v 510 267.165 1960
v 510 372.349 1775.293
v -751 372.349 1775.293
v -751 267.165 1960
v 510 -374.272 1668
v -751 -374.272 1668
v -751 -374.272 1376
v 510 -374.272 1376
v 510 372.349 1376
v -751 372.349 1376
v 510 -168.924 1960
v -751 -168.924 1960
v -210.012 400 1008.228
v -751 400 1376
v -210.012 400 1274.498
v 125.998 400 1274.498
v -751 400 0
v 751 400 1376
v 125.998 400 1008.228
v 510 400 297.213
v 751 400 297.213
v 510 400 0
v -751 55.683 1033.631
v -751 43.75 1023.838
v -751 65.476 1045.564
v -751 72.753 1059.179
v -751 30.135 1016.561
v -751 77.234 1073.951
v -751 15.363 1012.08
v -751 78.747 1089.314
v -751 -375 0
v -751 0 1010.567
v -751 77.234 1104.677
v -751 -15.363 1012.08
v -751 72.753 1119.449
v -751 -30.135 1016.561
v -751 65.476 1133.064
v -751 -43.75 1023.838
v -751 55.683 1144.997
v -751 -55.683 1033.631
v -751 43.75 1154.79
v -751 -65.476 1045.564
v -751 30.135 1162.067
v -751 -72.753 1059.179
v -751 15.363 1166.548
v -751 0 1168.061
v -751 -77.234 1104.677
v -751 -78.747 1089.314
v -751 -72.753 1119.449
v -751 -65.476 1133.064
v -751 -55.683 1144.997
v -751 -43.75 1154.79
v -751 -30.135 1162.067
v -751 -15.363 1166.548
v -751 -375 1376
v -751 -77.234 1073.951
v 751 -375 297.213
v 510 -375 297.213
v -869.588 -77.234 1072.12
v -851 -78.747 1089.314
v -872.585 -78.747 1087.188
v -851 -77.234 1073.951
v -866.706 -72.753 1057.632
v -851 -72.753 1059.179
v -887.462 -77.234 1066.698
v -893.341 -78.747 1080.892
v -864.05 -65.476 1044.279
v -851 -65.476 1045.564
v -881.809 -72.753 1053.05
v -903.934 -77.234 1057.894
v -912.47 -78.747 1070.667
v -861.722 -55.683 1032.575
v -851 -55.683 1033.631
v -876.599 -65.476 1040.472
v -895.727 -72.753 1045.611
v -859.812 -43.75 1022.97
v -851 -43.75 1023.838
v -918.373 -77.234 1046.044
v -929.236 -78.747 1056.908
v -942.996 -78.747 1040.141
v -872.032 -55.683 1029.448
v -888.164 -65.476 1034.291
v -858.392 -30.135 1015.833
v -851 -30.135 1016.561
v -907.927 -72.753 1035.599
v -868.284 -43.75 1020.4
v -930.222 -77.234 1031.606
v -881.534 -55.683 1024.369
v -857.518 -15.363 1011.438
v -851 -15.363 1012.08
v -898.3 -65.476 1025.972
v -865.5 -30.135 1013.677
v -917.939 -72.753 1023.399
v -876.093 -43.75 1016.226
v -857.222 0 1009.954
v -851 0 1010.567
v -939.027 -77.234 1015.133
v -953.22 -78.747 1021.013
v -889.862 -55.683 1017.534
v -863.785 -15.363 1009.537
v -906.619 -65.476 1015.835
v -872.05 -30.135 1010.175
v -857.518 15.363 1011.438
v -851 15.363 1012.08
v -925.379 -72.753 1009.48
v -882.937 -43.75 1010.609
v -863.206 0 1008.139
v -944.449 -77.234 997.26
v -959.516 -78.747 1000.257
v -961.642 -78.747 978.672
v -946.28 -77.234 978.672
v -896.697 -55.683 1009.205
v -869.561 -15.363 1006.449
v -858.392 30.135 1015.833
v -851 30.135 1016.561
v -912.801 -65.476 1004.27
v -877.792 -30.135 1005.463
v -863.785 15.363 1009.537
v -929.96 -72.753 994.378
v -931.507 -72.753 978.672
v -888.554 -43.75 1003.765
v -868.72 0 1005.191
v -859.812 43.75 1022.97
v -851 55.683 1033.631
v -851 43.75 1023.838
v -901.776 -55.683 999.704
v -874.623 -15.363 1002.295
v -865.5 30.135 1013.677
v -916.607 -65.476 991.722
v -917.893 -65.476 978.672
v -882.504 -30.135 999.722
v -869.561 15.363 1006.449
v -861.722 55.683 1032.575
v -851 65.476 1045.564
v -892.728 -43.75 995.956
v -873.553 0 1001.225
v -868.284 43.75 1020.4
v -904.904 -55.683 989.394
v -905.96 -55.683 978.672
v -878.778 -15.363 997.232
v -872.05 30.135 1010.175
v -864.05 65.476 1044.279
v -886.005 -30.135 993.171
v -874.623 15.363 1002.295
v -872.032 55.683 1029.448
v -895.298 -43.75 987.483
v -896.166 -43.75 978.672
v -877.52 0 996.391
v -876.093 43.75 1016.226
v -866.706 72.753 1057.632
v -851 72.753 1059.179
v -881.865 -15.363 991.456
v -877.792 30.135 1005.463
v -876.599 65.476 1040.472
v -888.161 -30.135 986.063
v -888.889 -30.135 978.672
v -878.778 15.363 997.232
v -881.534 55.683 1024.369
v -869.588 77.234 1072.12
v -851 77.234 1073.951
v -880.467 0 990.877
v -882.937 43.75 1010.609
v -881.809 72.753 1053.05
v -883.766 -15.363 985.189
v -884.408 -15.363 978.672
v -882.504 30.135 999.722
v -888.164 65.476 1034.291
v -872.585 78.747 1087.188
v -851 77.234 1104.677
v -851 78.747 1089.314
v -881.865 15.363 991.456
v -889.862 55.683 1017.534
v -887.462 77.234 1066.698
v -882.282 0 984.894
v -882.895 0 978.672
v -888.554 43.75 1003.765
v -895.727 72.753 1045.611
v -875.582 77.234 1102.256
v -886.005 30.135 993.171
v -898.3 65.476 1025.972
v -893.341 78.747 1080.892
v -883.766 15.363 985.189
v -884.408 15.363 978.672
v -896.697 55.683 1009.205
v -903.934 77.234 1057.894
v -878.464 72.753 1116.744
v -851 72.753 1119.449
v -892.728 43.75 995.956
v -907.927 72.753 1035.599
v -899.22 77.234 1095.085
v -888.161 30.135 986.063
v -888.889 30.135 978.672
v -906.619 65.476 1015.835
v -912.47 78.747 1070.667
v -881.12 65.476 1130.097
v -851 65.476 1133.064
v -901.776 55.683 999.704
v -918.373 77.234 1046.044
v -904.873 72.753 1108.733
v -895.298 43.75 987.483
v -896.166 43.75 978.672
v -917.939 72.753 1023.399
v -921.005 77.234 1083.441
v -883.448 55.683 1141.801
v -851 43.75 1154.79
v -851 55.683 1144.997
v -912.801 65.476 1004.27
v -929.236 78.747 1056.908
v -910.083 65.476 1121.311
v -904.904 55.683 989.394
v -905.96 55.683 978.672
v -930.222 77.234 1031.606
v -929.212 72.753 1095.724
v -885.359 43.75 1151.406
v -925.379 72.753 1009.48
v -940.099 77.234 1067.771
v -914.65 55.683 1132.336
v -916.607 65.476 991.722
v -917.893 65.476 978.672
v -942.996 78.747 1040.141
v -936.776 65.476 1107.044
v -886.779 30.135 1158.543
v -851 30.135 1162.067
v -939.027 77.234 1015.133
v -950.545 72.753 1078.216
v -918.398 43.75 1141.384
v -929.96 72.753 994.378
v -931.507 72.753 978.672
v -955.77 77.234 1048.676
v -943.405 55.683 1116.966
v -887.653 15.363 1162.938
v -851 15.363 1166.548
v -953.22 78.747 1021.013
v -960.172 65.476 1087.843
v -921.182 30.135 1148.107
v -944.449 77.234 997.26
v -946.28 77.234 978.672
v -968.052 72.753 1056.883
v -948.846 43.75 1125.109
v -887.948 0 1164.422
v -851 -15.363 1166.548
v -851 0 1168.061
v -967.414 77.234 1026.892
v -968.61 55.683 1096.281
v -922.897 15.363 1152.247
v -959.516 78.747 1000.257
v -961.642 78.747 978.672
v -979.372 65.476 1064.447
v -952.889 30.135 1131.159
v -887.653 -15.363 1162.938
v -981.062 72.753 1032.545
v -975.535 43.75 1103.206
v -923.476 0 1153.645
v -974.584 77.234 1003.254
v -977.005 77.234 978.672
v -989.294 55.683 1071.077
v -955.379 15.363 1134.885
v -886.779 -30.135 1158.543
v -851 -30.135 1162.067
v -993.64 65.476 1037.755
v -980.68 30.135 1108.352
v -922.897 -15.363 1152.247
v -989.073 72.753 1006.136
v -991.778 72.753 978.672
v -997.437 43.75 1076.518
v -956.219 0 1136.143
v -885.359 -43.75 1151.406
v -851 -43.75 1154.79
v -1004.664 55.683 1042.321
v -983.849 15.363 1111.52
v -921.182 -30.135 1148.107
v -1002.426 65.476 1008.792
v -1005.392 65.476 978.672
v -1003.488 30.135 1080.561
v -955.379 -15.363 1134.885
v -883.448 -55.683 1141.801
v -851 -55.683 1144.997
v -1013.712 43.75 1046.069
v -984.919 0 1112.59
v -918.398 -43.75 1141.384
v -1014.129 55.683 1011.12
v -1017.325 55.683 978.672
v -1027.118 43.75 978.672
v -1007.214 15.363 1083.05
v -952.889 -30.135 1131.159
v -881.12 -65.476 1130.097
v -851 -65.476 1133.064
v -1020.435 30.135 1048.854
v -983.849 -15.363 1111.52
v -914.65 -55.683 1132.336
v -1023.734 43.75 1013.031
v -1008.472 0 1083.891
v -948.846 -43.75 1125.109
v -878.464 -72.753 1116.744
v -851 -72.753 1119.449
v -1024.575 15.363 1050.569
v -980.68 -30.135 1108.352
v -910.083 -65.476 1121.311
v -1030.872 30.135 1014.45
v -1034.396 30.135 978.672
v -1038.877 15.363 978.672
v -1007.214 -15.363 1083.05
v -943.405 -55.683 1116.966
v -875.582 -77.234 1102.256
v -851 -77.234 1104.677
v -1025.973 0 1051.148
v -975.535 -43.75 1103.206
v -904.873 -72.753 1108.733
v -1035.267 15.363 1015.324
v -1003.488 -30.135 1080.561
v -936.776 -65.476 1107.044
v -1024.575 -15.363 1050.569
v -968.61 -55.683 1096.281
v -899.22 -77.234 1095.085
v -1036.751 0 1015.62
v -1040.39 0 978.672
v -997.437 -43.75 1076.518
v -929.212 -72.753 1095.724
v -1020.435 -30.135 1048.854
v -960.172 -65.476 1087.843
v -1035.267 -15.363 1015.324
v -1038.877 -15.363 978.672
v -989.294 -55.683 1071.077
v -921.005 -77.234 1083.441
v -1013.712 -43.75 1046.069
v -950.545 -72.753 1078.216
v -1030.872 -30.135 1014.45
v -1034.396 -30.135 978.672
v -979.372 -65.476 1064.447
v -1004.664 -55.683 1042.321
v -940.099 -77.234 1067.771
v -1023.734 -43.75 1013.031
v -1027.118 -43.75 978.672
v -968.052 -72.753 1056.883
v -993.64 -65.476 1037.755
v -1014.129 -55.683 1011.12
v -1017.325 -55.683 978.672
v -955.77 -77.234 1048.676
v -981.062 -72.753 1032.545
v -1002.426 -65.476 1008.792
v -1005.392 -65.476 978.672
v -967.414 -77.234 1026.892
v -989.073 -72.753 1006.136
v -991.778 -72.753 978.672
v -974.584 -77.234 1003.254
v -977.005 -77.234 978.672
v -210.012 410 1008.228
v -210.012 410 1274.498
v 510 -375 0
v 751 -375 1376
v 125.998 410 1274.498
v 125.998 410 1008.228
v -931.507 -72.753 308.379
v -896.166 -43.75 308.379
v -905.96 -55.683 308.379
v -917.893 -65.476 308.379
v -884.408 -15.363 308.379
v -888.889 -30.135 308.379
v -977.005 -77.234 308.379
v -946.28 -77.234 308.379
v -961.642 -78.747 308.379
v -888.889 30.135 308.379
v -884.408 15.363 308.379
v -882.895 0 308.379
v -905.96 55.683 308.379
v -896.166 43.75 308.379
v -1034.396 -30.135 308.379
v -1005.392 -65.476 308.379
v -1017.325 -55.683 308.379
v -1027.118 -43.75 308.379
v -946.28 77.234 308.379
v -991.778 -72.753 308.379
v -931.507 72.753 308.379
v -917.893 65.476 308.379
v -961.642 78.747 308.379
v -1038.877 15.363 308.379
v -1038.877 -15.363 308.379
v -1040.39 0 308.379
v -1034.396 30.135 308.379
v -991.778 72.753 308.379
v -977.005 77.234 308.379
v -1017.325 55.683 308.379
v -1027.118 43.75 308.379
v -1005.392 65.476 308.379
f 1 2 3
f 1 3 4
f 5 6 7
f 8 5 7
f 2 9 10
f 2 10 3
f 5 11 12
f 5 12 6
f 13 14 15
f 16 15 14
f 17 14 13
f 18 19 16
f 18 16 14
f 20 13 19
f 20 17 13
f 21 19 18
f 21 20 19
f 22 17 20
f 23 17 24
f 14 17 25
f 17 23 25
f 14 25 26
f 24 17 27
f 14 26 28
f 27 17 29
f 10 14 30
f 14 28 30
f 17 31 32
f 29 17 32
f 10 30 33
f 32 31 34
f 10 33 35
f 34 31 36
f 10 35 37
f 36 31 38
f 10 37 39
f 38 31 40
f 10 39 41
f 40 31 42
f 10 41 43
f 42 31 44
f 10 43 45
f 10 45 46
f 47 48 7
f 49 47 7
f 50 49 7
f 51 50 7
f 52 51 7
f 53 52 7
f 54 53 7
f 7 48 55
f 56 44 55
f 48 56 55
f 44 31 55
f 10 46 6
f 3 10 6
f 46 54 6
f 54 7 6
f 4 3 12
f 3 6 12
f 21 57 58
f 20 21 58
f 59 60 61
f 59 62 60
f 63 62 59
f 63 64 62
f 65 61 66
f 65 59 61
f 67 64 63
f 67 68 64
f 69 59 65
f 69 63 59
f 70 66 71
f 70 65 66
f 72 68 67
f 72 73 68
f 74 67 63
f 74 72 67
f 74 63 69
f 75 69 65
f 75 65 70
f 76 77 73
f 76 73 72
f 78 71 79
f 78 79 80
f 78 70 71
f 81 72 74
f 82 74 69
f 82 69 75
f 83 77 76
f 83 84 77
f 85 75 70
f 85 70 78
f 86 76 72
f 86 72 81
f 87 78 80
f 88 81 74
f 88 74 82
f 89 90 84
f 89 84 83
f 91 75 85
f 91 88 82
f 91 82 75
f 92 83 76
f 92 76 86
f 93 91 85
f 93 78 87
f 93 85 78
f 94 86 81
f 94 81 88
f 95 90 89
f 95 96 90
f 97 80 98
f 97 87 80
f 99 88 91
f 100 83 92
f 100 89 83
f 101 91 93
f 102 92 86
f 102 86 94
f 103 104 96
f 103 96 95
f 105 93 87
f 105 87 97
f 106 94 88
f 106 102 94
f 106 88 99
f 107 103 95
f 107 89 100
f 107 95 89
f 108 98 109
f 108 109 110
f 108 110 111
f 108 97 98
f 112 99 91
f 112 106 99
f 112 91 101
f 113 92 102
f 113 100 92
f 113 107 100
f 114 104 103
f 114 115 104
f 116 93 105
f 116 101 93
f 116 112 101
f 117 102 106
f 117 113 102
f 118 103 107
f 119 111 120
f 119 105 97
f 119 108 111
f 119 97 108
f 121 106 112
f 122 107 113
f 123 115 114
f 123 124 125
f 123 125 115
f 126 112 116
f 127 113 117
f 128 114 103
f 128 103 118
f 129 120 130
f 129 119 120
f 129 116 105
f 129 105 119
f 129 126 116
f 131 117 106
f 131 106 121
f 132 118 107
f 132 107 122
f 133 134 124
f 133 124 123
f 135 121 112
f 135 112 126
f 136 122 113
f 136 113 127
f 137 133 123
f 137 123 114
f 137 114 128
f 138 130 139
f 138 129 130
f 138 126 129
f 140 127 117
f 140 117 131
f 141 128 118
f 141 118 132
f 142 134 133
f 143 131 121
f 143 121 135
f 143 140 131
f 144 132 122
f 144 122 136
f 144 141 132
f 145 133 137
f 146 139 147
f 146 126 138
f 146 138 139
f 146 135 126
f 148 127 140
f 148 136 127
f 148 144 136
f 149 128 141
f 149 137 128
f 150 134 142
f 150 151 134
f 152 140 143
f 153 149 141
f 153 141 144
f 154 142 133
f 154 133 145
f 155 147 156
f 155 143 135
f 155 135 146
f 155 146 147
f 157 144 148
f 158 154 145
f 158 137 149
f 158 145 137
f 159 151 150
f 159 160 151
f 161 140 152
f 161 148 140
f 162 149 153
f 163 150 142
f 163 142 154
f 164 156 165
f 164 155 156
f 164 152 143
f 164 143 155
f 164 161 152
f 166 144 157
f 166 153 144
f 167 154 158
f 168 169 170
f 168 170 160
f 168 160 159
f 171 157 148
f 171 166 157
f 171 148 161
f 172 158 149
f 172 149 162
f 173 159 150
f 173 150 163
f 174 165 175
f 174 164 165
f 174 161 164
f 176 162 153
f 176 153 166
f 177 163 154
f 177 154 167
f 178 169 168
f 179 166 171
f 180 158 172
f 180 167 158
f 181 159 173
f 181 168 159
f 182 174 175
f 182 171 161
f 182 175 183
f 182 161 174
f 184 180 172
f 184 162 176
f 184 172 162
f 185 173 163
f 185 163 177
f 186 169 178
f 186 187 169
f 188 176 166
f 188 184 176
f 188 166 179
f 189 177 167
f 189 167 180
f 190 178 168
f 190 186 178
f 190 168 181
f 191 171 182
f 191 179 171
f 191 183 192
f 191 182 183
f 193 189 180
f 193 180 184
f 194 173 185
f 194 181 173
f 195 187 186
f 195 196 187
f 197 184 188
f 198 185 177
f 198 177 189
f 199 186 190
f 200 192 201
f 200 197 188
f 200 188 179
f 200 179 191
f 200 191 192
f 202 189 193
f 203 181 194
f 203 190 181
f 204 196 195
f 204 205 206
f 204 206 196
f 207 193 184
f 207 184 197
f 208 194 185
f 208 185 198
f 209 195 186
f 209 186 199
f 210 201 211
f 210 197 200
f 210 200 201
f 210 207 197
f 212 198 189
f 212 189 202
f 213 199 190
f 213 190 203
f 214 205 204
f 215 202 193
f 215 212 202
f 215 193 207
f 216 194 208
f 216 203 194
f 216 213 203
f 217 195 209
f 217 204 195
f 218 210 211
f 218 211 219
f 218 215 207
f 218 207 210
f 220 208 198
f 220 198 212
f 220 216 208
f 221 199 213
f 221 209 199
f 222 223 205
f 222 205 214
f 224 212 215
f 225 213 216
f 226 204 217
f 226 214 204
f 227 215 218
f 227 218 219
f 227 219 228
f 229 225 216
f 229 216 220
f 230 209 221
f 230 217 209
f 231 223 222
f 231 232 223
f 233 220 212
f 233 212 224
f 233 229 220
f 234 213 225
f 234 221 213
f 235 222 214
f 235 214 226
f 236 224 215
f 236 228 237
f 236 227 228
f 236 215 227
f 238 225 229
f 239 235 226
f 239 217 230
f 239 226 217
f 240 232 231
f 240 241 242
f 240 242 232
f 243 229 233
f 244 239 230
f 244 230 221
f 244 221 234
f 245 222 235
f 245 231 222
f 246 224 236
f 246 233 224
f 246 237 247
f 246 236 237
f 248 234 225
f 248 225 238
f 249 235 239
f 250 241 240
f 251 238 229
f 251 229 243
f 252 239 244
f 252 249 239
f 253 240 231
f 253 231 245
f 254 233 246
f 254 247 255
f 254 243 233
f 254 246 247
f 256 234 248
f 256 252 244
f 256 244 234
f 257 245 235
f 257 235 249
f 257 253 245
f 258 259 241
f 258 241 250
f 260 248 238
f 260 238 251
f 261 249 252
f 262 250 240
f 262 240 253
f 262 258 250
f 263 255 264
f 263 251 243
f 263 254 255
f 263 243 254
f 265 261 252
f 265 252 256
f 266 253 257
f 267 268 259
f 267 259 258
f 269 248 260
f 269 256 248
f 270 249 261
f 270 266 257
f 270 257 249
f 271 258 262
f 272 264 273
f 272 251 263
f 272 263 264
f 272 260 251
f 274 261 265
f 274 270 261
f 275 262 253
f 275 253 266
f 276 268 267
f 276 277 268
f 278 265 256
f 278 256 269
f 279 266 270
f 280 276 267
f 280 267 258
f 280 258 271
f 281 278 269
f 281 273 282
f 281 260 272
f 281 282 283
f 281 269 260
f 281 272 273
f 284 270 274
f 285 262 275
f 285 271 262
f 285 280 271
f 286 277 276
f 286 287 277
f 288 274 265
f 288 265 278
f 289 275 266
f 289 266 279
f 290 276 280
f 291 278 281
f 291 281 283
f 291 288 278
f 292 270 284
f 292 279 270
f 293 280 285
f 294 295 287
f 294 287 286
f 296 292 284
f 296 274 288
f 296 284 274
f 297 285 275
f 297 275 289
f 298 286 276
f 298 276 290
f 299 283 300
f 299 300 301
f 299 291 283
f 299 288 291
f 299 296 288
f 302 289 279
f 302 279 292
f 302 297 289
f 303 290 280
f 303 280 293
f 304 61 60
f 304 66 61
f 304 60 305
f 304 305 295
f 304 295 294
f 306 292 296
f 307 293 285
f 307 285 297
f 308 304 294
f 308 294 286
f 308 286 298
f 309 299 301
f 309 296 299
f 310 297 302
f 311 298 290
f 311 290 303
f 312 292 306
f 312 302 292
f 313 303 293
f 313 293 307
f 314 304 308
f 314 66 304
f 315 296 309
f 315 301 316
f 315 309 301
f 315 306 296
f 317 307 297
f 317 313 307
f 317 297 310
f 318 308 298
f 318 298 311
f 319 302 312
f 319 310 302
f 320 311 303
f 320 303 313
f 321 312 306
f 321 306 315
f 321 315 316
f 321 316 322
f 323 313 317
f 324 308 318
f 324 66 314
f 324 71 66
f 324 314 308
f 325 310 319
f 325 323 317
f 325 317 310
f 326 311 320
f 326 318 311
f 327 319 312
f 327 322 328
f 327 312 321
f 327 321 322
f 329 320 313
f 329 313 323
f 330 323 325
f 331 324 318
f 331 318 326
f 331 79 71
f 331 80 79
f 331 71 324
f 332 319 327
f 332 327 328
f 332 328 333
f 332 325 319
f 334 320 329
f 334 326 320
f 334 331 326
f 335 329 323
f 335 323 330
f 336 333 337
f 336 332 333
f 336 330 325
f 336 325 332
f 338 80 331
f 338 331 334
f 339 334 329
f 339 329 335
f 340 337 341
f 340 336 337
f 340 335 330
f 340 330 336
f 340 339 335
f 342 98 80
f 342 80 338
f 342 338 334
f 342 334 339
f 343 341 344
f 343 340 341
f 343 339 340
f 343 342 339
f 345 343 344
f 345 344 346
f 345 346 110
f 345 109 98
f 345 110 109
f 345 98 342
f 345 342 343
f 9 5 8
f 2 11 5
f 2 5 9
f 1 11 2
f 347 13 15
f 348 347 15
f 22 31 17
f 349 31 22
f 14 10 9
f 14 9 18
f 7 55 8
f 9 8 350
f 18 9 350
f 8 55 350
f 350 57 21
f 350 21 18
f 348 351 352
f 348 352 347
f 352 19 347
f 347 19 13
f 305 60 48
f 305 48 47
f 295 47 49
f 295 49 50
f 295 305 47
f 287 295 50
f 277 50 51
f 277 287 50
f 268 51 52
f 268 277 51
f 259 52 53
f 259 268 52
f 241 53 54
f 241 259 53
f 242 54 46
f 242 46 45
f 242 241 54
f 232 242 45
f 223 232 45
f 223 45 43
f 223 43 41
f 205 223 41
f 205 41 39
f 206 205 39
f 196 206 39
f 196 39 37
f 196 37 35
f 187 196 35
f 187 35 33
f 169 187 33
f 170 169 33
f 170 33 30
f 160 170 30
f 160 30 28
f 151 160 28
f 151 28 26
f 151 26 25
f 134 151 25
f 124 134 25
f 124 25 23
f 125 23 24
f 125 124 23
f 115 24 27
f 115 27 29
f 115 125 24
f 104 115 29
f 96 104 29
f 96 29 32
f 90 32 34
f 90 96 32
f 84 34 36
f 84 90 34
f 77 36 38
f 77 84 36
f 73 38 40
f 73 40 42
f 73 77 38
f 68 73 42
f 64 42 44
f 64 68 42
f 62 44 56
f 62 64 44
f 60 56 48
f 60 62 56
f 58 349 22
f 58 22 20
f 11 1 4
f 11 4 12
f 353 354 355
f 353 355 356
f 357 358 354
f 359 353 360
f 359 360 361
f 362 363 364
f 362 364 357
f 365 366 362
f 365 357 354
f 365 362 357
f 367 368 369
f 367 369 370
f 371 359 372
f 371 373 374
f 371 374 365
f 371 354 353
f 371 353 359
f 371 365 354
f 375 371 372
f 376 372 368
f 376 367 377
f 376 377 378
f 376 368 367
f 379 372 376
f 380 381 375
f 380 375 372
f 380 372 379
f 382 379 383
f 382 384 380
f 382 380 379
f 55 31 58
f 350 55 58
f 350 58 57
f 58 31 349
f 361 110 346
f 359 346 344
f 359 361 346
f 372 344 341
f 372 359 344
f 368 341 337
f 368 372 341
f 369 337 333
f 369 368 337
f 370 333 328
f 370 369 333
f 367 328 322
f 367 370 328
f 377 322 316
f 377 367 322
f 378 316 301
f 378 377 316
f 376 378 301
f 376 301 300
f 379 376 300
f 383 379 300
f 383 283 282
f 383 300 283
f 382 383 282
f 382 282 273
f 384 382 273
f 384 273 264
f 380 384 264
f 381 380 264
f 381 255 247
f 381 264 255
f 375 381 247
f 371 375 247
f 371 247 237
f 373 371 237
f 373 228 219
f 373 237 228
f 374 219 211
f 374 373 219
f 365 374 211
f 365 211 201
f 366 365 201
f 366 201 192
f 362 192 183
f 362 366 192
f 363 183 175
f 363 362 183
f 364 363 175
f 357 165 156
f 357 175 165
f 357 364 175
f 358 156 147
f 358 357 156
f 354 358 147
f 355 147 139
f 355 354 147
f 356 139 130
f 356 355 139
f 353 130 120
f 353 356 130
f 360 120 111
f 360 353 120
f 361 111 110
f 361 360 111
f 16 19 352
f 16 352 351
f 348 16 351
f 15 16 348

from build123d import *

# Parameters (mm, degrees)
F0_W      = 1502
F0_H      = 750
F1_DEPTH  = 1376
F3_R      = 78.7473915707
F5_W      = 750
F5_H      = 297.2130477428
F6_DEPTH  = 241
F8_DEPTH  = 1261
F9_DEPTH  = 25
F10_W     = 336.0105156898
F10_H     = 266.2700414658
F11_DEPTH = 10


with BuildPart() as f1:
    # F0 (on Top) → F1 (new body)
    with BuildSketch(Plane.XY):
        Rectangle(F0_W, F0_H)
    extrude(amount=F1_DEPTH)

    # F4: sweep along a path in F2
    with BuildLine(Plane.XZ) as f4_path:
        Line((-751, 1078.6715745926), (-851, 1078.6715745926))
        ThreePointArc((-851, 1078.6715745926), (-921.7106781187, 1049.3822527112), (-951, 978.6715745926))
        Line((-951, 978.6715745926), (-951, 308.378726244))
    # F3 (on face) → F4 (sweep)
    with BuildSketch(Plane(origin=(-751, 0, 0), x_dir=(0, -1, 0), z_dir=(-1, 0, 0))):
        with Locations((0, 1089.3139839172)):
            Circle(F3_R)
    sweep(path=f4_path.line)

    # F5 (on face) → F6 (cut)
    with BuildSketch(Plane.YZ.offset(751)):
        with Locations((0, 148.6065238714)):
            Rectangle(F5_W, F5_H)
    extrude(amount=-F6_DEPTH, mode=Mode.SUBTRACT)

    # F7 (on face) → F8 (join, through all)
    with BuildSketch(Plane.YZ.offset(510)):
        Polygon((-374.2722838136, 1668), (-374.2722838136, 1376), (372.3494112492, 1376), (372.3494112492, 1775.292634964), (267.1647369862, 1960), (-168.9238548279, 1960), align=None)
    extrude(amount=-F8_DEPTH)

    # F9 (add): a face of the model
    f9_faces = [f1.faces().sort_by_distance(p)[0] for p in [
        (-22.6360261364, 375, 707.3651464289),
    ]]
    extrude(f9_faces, amount=F9_DEPTH)

    # F10 (on face) → F11 (join)
    with BuildSketch(Plane(origin=(0, 400, 0), x_dir=(-1, 0, 0), z_dir=(0, 1, 0))):
        with Locations((42.0069694519, 1141.3634419441)):
            Rectangle(F10_W, F10_H)
    extrude(amount=F11_DEPTH)


solid = f1.part
